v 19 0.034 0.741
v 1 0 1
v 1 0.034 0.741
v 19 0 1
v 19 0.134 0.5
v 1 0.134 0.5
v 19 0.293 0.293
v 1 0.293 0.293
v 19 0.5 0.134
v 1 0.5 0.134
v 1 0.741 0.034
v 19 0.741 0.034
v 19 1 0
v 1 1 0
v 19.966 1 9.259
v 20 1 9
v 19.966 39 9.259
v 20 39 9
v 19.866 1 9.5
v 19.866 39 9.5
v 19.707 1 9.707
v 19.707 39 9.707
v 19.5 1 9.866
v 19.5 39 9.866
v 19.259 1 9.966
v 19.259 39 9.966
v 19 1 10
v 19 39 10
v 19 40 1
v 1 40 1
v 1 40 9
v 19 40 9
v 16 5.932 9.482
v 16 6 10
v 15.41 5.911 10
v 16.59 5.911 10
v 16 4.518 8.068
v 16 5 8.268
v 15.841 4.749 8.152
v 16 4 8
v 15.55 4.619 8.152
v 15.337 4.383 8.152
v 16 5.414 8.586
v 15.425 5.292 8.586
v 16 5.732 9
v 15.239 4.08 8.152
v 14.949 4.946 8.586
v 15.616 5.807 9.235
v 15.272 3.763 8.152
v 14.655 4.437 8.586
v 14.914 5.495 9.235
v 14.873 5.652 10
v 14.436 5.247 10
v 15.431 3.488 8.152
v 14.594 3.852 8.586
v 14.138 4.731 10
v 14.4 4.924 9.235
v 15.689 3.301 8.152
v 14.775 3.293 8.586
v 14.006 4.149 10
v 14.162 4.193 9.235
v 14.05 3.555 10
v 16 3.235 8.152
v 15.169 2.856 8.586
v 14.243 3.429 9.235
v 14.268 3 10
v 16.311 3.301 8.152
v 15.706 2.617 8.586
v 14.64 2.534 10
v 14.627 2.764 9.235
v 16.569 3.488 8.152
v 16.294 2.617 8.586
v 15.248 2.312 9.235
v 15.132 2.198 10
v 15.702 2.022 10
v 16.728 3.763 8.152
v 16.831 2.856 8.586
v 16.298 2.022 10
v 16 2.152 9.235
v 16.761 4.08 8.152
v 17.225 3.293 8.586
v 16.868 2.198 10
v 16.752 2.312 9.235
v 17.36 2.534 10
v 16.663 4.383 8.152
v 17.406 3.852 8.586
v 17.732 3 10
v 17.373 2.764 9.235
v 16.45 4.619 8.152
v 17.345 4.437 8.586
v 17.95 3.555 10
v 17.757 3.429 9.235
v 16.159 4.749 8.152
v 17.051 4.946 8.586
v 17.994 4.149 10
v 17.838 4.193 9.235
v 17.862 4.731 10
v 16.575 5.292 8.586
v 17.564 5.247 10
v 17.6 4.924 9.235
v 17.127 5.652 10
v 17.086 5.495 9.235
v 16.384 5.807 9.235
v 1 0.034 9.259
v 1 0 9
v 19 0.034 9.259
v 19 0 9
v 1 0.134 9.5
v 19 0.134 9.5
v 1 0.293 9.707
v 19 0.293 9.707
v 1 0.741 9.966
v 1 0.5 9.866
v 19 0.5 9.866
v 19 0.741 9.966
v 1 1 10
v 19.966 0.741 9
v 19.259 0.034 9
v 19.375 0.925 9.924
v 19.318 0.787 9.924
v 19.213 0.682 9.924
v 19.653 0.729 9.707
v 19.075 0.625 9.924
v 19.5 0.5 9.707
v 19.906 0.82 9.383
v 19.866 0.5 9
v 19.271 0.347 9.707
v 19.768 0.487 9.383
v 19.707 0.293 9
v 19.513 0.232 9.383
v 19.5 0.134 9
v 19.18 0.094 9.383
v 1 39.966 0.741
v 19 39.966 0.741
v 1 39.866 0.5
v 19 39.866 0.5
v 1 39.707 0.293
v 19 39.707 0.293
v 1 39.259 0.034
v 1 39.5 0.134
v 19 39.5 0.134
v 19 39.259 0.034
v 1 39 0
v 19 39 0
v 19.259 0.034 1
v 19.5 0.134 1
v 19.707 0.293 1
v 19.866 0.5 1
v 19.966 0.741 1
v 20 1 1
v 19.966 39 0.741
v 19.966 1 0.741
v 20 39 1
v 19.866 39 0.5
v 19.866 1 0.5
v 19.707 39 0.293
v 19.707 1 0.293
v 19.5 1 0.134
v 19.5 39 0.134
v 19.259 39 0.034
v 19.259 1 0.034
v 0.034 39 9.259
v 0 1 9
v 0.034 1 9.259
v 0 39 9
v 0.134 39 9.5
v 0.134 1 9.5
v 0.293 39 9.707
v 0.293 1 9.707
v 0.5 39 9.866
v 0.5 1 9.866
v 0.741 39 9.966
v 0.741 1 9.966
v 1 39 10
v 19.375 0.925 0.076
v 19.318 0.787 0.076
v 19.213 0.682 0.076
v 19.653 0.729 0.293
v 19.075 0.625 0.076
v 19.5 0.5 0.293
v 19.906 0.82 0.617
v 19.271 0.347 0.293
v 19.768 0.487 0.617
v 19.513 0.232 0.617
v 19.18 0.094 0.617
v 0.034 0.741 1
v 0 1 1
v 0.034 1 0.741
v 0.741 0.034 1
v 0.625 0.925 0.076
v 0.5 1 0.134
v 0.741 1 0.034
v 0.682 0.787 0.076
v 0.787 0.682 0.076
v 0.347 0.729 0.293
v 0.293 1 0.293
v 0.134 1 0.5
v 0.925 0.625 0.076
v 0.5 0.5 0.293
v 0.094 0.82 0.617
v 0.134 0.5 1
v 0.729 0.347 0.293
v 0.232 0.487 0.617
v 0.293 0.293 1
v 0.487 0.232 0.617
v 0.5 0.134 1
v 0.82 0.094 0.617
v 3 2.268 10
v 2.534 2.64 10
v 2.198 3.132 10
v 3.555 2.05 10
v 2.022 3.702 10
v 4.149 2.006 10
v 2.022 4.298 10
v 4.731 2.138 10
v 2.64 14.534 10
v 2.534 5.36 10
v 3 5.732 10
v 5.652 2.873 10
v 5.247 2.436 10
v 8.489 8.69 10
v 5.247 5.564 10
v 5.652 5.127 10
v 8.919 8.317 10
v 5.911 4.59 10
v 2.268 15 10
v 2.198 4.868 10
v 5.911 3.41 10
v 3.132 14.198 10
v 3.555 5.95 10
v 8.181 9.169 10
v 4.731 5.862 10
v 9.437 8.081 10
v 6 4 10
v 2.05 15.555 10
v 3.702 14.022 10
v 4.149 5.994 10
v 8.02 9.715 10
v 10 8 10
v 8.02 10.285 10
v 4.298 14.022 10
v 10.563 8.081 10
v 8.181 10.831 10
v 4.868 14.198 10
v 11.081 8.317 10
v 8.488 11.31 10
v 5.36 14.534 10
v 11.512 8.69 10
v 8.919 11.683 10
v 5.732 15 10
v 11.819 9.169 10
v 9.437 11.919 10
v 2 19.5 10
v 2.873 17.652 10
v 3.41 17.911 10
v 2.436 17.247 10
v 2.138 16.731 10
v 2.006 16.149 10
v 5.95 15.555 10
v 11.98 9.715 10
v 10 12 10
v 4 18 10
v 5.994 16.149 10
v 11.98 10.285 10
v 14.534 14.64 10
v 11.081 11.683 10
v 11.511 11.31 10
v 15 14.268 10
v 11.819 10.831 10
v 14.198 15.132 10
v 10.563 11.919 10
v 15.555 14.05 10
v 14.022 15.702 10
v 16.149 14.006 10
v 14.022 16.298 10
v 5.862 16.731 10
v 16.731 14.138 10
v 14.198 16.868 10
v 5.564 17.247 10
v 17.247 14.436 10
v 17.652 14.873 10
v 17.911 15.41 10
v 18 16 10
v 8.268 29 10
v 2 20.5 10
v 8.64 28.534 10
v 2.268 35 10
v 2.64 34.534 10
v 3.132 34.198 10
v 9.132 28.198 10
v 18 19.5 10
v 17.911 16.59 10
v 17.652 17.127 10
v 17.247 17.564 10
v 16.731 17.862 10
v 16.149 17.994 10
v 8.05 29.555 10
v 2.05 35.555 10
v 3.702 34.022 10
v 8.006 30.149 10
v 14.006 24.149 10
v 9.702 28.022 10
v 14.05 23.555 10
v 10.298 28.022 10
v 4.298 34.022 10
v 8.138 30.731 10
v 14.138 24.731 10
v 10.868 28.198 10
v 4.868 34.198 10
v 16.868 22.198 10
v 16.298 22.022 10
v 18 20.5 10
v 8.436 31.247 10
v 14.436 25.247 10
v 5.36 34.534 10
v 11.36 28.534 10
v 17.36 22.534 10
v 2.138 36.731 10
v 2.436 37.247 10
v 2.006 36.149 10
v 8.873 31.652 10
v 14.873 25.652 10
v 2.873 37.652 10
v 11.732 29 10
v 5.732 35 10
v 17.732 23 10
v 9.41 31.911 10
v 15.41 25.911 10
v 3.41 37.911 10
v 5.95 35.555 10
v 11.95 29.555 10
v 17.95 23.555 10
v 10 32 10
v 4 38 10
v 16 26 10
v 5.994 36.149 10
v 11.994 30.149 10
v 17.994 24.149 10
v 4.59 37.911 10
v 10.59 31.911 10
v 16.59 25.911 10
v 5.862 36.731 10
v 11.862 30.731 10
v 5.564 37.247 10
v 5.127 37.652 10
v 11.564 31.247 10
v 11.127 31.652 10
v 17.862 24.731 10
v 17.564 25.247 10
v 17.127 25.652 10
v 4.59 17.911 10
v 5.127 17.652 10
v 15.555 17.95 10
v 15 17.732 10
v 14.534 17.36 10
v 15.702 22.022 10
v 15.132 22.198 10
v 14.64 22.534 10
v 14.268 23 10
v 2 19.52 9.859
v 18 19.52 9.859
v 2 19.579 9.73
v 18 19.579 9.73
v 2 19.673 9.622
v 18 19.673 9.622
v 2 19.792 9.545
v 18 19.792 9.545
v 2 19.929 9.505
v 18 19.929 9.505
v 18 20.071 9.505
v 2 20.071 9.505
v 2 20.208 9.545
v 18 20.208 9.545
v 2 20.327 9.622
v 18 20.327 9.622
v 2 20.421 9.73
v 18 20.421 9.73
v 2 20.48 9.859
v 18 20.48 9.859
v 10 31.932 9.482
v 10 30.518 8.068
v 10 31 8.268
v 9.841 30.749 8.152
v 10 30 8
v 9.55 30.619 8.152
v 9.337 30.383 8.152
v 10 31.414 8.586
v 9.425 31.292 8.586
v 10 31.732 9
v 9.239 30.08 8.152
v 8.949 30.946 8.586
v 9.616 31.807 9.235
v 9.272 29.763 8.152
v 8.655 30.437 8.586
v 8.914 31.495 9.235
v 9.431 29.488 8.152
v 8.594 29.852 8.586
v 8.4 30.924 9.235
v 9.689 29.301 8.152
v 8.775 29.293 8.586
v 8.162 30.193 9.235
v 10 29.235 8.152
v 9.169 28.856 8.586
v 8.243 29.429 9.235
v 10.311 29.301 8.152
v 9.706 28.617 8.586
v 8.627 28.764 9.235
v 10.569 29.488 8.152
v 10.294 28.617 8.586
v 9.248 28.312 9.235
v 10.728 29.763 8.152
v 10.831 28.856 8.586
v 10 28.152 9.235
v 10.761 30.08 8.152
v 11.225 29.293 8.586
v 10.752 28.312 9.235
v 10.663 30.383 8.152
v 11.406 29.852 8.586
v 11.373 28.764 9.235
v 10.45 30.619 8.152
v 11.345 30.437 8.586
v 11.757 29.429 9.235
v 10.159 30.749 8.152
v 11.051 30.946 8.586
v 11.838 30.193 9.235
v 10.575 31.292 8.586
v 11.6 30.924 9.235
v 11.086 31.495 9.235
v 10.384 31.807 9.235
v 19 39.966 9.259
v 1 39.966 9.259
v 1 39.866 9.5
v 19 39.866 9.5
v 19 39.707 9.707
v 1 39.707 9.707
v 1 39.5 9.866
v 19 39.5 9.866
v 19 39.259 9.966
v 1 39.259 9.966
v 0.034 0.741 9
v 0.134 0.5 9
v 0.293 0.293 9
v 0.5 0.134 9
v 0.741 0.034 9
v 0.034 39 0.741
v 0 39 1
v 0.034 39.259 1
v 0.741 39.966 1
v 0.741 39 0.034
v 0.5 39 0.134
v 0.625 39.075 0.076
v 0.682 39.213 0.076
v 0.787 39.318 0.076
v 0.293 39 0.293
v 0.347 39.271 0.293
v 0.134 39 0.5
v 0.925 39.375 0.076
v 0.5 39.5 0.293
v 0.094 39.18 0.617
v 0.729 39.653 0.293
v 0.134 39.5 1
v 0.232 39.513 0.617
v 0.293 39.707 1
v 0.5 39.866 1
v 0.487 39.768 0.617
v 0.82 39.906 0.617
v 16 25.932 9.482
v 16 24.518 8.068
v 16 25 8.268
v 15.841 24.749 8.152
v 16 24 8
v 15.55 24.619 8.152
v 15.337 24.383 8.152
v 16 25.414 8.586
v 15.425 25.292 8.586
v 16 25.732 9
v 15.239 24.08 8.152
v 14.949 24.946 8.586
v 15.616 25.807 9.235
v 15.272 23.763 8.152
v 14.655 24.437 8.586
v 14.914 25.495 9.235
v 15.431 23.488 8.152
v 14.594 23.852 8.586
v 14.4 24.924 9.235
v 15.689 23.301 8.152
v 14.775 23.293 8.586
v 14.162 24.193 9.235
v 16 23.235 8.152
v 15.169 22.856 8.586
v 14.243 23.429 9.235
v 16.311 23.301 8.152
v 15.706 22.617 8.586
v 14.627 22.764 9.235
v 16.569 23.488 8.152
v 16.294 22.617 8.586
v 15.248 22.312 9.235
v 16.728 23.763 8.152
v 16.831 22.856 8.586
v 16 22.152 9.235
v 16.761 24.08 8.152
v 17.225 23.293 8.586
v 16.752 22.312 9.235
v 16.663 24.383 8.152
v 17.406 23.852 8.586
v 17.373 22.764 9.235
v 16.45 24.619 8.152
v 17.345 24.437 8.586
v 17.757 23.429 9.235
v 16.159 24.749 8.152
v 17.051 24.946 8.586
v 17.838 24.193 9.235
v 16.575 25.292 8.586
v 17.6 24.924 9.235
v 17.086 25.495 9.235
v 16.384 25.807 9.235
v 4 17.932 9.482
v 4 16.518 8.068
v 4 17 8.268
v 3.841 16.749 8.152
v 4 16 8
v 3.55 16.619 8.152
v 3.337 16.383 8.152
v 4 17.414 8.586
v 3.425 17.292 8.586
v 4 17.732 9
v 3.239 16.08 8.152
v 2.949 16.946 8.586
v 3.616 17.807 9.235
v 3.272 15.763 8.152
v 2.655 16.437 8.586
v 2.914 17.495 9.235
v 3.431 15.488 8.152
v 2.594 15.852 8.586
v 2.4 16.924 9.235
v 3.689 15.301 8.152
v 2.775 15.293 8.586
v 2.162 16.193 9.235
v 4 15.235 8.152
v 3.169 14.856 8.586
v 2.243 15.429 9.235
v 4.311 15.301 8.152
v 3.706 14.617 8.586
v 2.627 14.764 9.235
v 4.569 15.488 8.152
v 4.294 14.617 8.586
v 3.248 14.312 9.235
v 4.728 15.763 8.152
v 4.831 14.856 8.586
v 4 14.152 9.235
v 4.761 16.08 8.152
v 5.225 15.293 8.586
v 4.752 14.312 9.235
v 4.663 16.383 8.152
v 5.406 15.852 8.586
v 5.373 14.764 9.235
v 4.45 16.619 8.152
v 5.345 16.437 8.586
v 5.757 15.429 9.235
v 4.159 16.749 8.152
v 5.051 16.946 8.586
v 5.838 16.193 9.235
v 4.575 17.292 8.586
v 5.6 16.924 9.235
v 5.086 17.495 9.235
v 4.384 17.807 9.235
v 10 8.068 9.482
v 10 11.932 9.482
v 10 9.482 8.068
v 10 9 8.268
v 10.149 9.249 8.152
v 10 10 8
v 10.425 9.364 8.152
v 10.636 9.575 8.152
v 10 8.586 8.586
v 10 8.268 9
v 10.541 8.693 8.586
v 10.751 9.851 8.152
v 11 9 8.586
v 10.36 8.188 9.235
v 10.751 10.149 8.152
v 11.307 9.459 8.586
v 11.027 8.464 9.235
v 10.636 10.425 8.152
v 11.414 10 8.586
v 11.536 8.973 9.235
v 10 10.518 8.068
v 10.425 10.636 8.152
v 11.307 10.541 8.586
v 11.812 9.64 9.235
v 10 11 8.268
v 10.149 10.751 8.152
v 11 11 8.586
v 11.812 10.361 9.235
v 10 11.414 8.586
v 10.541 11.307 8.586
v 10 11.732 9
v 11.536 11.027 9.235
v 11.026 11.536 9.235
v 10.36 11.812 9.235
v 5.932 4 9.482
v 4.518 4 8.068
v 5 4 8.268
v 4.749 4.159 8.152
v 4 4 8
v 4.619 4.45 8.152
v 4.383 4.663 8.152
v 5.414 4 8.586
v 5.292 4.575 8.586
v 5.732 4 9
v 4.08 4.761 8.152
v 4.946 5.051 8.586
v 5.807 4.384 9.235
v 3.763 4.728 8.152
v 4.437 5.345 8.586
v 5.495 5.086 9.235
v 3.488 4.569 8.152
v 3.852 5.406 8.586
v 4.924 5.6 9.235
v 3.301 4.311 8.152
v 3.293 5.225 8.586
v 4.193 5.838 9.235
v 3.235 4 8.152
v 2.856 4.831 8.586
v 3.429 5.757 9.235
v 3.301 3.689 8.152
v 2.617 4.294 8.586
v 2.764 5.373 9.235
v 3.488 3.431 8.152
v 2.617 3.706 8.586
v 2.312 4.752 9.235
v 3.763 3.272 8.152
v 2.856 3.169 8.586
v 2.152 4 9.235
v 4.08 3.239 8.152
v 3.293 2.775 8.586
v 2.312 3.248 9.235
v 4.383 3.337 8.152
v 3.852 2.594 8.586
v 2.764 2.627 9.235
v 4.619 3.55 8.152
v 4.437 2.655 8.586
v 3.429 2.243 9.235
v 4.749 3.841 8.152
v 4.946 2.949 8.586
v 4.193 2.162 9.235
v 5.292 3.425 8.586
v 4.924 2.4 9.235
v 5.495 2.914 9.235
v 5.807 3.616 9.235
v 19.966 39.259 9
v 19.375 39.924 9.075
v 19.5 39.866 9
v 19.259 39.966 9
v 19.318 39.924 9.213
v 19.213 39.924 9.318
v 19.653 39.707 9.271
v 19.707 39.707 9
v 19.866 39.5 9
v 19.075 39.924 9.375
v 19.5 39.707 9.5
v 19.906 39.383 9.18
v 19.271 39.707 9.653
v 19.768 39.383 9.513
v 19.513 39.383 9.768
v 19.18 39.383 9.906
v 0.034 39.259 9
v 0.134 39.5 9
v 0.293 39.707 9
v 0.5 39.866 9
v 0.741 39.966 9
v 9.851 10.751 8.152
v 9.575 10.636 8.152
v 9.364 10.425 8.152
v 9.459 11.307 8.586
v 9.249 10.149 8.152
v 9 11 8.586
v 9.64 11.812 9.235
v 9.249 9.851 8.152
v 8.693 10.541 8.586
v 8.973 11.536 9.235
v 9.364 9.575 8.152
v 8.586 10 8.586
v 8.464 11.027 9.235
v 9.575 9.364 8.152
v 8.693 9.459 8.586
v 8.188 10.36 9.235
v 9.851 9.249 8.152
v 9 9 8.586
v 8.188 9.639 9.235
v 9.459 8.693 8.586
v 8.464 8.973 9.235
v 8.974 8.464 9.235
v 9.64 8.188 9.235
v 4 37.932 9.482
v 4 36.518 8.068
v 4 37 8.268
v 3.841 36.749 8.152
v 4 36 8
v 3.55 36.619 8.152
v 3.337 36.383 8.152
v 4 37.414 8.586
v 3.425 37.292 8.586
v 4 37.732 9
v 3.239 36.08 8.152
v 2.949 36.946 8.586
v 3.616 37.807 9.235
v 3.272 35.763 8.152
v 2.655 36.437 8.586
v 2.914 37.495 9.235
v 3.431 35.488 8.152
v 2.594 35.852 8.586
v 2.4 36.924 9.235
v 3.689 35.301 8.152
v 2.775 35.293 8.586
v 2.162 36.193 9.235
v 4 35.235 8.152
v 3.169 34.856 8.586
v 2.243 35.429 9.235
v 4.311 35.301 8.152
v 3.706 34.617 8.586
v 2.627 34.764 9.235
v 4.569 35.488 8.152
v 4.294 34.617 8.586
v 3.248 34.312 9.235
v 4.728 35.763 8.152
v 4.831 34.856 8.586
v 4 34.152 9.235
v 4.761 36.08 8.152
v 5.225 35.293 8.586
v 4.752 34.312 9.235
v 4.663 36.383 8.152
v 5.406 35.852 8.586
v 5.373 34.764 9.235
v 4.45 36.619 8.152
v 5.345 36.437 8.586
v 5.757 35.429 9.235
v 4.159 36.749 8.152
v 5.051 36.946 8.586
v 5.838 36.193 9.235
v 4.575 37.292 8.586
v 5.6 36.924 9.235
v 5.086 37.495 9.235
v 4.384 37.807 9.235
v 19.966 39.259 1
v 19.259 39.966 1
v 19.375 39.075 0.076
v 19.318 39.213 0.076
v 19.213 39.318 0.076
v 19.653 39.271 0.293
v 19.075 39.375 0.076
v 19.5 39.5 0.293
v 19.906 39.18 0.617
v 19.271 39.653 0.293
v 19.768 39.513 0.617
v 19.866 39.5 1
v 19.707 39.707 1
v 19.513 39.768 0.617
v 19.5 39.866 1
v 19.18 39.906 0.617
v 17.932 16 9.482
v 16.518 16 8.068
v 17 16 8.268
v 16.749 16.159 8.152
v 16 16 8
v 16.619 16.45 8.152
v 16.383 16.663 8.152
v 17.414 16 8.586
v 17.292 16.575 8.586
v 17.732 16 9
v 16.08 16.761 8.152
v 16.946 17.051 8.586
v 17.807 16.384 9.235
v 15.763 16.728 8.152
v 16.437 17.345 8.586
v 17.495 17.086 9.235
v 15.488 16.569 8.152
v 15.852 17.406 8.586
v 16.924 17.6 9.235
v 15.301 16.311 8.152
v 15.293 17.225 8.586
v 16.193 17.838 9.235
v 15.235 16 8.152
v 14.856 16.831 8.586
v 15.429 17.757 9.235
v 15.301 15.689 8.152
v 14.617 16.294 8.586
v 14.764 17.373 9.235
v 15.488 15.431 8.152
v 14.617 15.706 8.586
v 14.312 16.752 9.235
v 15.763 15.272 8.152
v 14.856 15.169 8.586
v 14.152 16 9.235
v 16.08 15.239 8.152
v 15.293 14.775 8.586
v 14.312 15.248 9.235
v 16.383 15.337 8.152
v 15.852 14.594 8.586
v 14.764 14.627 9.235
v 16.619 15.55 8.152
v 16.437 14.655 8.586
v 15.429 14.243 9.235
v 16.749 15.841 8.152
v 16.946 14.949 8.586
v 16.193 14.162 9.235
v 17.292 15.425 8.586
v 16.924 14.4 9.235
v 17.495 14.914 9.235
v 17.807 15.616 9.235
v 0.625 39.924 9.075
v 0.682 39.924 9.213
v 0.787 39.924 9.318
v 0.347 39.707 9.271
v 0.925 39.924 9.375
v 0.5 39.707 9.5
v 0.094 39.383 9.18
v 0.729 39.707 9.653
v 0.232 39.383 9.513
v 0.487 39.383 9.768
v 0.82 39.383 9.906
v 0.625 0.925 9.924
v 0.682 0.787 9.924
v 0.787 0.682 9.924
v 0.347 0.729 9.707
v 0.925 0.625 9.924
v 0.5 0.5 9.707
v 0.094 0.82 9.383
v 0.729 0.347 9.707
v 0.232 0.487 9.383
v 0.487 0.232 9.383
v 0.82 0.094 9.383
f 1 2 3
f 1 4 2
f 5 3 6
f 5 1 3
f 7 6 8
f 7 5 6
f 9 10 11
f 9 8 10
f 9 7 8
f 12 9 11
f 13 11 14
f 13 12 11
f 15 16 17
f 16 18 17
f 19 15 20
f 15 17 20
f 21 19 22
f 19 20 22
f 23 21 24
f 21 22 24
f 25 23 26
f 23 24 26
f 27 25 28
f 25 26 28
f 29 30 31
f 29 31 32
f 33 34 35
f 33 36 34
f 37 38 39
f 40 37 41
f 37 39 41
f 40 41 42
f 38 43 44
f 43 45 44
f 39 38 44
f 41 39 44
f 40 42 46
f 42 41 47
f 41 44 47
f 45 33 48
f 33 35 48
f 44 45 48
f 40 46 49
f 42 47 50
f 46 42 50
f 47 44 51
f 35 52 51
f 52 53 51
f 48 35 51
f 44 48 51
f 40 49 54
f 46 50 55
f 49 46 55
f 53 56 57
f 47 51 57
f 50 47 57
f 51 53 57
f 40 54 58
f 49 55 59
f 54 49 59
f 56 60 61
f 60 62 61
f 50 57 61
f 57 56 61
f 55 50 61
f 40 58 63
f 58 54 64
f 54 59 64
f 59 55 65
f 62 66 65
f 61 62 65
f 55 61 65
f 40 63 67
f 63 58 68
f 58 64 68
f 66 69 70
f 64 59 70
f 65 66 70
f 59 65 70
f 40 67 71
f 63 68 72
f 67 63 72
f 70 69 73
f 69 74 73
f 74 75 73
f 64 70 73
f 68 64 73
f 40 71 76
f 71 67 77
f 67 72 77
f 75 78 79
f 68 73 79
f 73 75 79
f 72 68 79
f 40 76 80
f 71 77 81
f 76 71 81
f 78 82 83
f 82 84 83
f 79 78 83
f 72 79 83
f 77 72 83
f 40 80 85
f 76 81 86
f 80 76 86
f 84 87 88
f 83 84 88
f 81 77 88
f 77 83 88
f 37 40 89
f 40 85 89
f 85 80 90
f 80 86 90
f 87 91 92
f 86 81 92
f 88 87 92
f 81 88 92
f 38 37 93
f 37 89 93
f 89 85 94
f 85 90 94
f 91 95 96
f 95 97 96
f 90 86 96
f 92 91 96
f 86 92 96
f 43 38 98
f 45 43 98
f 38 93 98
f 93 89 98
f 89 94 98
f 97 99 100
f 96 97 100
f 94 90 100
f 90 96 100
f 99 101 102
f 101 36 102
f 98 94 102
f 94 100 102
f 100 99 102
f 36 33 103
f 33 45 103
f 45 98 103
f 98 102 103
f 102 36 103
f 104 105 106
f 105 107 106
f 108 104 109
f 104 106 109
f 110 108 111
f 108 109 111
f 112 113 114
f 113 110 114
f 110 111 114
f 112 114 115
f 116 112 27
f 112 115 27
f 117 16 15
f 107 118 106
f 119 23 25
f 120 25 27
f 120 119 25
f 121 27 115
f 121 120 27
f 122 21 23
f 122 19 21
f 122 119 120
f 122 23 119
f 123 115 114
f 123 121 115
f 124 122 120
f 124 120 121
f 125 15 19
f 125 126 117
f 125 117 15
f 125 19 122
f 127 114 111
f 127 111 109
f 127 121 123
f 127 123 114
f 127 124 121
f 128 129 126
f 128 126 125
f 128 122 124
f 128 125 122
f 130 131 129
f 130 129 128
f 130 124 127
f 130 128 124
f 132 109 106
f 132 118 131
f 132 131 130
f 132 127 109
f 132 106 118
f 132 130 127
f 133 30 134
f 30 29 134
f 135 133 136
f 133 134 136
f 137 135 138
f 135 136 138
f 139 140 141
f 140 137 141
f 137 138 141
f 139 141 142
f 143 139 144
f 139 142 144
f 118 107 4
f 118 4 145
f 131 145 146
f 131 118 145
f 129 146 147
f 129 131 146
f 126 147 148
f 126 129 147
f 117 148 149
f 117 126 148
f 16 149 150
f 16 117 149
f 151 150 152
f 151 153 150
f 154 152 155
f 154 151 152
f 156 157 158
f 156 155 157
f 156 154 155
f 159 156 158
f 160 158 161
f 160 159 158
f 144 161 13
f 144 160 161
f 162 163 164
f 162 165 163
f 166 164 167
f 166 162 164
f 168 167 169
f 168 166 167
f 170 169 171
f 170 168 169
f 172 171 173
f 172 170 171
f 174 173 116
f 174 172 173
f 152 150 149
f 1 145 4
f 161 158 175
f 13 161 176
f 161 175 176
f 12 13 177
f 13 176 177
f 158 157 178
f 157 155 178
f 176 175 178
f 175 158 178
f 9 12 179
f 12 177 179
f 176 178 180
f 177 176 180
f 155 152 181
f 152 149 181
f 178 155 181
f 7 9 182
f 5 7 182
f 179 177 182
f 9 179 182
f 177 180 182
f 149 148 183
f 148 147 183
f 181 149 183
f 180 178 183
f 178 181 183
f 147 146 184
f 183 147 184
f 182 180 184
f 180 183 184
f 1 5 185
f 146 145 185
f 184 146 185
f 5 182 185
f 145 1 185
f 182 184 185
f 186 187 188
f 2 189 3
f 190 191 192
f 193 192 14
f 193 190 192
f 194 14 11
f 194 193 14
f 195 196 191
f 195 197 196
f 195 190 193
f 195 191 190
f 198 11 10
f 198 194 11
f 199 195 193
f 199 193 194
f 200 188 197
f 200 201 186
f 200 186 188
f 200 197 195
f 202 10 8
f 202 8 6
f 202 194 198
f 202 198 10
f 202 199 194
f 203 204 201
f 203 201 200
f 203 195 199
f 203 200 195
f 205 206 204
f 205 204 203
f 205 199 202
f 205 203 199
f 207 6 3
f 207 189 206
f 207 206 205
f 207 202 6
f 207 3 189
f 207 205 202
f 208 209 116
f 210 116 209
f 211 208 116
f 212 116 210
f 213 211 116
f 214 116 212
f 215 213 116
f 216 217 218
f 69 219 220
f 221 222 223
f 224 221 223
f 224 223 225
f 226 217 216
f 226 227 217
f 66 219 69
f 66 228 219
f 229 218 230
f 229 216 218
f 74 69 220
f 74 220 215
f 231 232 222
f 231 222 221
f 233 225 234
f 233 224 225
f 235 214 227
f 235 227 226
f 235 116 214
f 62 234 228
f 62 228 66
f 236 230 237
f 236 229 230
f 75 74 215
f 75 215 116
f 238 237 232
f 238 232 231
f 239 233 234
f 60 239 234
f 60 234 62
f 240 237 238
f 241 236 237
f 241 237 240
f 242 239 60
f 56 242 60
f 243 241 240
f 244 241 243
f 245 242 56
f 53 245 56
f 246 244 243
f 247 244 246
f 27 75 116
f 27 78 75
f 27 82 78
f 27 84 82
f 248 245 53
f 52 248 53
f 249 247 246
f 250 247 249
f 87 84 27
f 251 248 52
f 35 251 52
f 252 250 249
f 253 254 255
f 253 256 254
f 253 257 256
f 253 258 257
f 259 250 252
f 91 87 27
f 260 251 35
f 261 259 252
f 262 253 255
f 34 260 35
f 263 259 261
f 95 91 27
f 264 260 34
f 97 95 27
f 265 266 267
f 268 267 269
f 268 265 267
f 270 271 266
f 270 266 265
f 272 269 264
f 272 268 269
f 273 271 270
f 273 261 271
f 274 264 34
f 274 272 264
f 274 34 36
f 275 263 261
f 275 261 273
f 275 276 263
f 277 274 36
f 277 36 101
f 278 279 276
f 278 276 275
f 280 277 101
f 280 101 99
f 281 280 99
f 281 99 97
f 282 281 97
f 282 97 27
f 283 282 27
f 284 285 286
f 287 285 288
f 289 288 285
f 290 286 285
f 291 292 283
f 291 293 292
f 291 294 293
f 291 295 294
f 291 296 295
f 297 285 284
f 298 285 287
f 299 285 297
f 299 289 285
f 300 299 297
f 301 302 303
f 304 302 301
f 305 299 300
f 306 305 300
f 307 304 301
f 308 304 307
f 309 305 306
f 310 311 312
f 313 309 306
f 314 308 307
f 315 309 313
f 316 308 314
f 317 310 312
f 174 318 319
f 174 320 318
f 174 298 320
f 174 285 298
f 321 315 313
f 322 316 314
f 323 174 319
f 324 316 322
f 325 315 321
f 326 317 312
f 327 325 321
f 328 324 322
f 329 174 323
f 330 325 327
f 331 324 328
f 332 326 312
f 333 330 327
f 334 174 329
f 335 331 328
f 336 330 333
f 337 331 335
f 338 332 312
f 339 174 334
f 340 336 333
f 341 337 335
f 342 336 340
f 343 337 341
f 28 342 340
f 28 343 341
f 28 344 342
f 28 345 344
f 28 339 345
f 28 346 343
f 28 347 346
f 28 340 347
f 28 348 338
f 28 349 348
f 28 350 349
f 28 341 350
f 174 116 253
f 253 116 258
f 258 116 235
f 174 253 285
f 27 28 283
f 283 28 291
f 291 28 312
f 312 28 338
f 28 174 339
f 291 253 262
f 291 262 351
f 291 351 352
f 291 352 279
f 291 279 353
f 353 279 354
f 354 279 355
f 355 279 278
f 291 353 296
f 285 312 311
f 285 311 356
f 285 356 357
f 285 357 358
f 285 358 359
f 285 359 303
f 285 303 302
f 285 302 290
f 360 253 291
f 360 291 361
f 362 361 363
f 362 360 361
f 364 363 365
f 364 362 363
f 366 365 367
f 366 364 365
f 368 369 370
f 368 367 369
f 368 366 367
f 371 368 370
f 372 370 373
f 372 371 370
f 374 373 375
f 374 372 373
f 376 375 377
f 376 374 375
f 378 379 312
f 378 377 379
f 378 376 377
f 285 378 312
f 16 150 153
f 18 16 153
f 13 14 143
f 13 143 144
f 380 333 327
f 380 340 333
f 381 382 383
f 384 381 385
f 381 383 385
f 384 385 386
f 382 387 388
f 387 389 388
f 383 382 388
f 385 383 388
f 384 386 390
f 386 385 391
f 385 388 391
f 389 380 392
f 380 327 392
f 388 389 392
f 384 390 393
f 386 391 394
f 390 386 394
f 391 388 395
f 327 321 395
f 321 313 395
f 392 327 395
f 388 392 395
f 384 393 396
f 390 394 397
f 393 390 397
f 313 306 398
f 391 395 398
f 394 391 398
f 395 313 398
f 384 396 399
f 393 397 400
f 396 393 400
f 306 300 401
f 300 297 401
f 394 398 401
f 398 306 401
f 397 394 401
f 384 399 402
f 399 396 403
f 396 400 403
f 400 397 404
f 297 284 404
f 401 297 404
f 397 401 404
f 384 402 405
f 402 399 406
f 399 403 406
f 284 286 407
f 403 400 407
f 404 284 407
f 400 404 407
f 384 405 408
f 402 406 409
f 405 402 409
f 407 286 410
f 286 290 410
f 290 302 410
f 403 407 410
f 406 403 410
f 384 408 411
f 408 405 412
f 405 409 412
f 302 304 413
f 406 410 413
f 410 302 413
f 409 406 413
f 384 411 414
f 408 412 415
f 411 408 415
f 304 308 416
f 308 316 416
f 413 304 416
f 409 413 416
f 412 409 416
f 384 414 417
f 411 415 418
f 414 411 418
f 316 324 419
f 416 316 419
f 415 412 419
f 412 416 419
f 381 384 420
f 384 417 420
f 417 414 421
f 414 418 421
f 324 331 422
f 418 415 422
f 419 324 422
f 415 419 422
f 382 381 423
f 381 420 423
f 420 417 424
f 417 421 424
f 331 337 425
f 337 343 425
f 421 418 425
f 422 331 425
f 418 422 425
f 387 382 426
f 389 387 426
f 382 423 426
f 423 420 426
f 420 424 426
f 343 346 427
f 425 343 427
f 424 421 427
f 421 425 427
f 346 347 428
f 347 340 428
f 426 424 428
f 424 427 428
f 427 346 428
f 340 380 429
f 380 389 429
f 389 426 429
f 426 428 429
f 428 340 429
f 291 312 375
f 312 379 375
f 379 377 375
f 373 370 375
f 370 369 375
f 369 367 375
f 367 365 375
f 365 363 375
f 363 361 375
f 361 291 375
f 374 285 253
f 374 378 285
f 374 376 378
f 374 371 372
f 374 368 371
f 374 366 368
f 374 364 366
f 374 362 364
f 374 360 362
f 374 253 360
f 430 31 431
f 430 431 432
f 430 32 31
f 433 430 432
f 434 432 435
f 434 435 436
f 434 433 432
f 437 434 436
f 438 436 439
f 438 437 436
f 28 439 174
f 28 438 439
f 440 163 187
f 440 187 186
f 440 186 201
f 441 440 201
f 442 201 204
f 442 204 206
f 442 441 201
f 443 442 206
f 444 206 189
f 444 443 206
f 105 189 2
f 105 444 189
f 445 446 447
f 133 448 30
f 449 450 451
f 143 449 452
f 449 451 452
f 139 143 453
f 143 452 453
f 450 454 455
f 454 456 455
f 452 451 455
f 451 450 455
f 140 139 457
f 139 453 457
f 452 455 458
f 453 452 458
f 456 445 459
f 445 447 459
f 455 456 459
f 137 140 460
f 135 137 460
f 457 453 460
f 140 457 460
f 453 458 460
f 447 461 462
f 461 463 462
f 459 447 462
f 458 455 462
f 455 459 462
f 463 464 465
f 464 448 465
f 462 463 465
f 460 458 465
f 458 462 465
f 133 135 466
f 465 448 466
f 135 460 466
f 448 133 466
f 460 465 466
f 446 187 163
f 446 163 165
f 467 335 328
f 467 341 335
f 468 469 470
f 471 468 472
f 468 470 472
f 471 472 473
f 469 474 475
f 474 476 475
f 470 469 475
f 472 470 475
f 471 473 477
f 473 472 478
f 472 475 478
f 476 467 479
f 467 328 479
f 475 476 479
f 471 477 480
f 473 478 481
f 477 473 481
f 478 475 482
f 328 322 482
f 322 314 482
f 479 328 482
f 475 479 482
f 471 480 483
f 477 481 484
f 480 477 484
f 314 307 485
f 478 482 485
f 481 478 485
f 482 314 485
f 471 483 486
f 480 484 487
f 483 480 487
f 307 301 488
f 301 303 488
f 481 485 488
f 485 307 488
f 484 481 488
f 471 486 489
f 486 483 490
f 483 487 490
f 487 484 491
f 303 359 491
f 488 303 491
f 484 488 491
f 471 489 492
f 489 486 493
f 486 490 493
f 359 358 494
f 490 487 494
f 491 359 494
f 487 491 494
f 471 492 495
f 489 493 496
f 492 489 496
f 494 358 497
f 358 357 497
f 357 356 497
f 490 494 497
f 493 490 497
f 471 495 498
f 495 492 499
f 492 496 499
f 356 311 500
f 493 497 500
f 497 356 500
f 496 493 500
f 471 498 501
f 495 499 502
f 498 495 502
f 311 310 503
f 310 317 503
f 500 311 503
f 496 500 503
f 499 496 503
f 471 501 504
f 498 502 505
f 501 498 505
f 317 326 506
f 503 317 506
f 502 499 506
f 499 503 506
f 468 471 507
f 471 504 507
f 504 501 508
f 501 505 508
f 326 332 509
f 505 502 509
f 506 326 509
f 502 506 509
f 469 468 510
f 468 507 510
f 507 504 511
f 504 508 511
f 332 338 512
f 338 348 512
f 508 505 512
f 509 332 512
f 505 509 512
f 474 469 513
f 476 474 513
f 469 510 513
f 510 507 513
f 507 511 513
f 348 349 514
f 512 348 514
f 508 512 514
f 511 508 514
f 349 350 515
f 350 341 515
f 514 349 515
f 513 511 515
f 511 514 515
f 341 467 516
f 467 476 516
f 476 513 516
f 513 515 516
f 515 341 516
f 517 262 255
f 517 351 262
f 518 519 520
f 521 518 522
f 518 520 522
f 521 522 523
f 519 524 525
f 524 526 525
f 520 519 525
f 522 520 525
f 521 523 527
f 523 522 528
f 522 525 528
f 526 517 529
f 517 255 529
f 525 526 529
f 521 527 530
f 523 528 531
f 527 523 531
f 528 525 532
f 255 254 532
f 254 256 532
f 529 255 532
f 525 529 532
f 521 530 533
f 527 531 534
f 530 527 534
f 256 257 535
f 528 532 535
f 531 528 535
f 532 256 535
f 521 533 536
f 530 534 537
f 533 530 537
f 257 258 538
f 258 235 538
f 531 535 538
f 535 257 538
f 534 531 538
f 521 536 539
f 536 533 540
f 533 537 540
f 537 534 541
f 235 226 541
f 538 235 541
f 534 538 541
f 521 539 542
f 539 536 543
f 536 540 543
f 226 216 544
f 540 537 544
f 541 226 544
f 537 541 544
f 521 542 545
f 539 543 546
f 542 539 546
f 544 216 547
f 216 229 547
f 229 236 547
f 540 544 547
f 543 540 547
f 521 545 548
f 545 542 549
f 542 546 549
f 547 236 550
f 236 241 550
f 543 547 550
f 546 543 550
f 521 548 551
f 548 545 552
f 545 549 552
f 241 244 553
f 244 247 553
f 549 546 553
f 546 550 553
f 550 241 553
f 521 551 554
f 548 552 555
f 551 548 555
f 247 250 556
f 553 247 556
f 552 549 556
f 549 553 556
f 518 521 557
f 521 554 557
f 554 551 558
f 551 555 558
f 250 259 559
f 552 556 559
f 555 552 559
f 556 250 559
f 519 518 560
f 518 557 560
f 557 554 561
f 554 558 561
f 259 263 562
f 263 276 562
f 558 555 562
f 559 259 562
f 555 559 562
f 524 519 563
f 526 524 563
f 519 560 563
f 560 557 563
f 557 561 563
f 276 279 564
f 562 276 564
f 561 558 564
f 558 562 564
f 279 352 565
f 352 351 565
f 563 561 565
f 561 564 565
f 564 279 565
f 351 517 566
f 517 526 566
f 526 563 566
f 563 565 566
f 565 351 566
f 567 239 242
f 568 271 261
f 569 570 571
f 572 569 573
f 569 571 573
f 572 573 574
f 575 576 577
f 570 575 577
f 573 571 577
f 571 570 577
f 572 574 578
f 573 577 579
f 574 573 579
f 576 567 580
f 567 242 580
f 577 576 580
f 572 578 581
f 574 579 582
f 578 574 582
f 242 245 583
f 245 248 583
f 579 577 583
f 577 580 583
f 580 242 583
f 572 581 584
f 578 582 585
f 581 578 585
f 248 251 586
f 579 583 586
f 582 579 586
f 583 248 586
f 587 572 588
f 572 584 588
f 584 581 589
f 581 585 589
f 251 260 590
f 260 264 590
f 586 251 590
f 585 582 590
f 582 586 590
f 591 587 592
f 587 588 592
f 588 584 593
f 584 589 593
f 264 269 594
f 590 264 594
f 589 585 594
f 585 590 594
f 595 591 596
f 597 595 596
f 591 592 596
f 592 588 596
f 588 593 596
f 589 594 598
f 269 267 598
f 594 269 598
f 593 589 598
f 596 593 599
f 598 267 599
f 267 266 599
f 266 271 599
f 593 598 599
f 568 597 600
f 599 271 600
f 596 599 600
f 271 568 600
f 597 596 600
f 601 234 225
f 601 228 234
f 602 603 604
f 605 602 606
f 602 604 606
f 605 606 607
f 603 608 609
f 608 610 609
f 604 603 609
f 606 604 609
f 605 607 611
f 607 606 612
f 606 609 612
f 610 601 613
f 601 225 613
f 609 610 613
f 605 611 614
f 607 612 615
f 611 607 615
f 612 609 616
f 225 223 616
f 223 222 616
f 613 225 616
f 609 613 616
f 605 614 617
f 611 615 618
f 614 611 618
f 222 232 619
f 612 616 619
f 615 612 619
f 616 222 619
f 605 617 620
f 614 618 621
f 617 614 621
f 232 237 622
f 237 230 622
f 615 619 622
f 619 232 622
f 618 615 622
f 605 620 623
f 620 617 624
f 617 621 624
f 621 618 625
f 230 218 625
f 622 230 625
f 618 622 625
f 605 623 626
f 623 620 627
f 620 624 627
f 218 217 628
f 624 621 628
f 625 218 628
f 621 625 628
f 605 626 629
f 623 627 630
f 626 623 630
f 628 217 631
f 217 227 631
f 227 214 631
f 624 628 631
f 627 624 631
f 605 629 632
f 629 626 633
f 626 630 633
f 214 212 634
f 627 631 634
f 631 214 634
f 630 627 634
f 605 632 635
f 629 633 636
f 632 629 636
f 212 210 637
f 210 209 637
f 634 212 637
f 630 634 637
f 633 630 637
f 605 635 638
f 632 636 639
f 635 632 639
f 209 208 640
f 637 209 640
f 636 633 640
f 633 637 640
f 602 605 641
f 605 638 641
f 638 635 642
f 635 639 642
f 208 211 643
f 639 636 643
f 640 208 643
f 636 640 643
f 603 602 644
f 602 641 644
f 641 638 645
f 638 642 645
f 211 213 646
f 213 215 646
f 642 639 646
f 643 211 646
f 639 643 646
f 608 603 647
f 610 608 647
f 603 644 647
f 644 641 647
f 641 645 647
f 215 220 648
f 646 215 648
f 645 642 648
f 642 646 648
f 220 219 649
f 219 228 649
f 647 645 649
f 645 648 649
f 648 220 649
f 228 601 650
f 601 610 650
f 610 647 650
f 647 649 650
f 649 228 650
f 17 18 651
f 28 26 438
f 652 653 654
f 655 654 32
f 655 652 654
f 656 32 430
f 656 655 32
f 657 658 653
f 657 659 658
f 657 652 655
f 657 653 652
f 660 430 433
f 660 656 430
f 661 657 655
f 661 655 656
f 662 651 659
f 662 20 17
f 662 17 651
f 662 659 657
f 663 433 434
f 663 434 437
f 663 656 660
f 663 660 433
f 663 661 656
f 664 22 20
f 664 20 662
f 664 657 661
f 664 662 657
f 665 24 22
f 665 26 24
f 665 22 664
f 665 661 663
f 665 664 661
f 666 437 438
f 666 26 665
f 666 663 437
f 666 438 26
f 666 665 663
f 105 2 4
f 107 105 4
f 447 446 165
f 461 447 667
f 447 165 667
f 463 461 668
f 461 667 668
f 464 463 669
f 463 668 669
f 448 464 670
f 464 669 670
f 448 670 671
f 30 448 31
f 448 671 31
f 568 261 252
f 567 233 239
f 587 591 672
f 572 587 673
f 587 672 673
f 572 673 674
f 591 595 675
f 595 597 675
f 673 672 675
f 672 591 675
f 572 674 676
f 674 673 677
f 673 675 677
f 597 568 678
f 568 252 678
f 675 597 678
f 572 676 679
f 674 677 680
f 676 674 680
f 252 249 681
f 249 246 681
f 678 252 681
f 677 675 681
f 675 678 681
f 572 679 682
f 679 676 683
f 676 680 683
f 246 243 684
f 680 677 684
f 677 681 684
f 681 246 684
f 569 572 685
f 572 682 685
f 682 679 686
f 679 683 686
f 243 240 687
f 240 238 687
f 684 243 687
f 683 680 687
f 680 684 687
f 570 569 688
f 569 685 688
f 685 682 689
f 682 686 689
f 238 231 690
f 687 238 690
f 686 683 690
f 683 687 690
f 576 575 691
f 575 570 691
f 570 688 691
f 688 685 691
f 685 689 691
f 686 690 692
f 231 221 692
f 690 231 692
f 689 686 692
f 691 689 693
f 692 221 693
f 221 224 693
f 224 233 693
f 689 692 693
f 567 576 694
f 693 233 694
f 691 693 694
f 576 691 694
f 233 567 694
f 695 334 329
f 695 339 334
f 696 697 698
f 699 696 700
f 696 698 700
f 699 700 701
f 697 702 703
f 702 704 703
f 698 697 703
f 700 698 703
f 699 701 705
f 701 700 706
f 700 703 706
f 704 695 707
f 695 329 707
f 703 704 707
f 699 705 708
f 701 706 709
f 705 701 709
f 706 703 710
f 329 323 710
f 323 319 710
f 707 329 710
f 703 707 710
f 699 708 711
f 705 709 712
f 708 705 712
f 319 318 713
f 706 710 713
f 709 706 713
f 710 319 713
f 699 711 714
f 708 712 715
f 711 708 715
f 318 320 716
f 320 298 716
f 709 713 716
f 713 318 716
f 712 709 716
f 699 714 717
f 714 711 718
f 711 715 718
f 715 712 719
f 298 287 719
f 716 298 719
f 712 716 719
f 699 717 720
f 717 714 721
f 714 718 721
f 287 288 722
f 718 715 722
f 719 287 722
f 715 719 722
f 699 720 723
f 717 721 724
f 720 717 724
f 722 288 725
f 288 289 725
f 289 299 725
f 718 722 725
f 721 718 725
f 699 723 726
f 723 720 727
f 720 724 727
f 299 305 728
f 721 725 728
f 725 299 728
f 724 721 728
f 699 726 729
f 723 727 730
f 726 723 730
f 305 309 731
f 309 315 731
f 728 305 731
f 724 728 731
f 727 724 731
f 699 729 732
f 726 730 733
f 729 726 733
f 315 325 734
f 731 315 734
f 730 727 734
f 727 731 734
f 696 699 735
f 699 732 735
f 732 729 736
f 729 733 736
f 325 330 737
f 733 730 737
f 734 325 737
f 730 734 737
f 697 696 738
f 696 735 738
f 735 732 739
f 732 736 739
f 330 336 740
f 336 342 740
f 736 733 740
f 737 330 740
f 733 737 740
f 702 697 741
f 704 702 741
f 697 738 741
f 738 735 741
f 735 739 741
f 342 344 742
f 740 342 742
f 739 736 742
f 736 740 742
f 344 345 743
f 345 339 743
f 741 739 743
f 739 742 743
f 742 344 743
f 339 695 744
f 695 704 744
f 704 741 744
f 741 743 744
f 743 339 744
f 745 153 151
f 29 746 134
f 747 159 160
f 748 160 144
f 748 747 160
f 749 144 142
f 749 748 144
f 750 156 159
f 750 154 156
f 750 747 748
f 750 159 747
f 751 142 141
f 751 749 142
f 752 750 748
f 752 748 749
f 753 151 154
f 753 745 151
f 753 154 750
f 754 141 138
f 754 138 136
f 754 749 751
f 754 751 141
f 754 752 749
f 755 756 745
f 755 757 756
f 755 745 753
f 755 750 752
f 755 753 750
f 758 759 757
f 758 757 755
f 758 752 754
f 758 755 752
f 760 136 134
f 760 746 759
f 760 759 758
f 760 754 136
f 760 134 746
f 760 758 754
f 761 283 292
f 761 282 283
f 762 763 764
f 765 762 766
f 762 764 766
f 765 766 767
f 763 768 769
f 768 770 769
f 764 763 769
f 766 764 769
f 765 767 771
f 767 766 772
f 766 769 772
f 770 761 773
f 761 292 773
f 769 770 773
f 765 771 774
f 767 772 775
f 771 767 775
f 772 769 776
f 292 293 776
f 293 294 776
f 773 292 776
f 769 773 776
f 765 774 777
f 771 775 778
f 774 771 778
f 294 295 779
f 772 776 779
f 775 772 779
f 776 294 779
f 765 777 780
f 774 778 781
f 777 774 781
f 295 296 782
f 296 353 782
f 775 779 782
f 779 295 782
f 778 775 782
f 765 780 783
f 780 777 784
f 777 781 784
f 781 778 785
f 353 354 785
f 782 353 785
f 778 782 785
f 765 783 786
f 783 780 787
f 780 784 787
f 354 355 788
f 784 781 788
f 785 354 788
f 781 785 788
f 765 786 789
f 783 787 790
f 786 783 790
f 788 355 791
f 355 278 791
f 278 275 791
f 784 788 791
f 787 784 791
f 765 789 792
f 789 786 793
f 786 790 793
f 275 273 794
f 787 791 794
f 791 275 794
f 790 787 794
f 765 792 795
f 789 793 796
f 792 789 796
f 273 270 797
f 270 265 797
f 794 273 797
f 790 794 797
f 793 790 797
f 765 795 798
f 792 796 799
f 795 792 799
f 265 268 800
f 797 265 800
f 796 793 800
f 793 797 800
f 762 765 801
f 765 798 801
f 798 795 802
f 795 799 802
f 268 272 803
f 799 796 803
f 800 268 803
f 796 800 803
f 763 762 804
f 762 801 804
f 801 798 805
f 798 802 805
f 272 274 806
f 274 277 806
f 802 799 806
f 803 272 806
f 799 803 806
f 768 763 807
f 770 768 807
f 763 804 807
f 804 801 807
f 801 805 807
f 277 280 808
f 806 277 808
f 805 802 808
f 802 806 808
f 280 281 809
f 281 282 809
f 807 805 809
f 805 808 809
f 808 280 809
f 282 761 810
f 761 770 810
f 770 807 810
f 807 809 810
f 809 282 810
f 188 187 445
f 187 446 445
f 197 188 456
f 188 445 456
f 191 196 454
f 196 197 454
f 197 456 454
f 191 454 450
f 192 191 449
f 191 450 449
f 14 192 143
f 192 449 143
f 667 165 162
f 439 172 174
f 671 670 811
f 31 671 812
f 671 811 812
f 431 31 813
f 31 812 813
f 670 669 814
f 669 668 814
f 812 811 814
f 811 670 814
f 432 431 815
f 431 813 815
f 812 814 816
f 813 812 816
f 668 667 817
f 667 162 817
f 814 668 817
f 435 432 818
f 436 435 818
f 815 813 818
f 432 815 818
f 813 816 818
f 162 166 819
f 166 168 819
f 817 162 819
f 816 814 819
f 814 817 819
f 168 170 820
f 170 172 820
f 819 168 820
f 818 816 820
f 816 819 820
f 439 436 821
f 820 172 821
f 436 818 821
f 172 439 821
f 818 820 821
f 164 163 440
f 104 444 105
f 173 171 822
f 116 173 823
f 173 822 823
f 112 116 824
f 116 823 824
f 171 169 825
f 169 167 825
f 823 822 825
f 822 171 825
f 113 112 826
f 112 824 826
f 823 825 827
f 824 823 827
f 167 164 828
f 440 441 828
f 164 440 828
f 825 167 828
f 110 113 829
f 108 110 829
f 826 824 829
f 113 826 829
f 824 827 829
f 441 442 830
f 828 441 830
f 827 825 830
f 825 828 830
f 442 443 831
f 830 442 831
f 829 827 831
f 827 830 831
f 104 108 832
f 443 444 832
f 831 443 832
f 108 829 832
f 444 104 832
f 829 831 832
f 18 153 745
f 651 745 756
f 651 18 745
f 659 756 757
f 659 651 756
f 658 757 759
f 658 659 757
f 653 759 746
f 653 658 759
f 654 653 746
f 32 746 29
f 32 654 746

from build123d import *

# Parameters (mm, degrees)
CYLINDER_R               = 0.5
CYLINDER_DEPTH           = 16
ARRAY002_X_COUNT         = 3
ARRAY002_X_PITCH         = 8.485281
ARRAY001_X_COUNT         = 3
ARRAY001_X_PITCH         = 8.485281
ARRAY001_PLACEMENT_ANGLE = 90
ARRAY_X_COUNT            = 3
ARRAY_X_PITCH            = 8.485281
ARRAY_PLACEMENT_ANGLE    = 90
BOX_W                    = 20
BOX_H                    = 40
BOX_DEPTH                = 10
FILLET_R                 = 1


with BuildPart() as division:
    # Cylinder → Cylinder (new body)
    with BuildSketch(Plane(origin=(2, 20, 10), x_dir=(0, 0, -1), z_dir=(1, 0, 0))):
        Circle(CYLINDER_R)
    extrude(amount=CYLINDER_DEPTH)


with BuildPart() as array002:
    # Sphere002 → Sphere002 (revolve)
    with BuildSketch(Plane.XZ):
        with BuildLine():
            ThreePointArc((0, -2), (2, 0), (0, 2))
            Line((0, 2), (0, -2))
        make_face()
    revolve(axis=Axis((0, 0, 0), (0, 0, 1)))

    # Array002 X: Array002 ×3


with BuildPart() as array002_1:
    add(array002.part)
    with Locations(*[Vector(0.707107, 0.707107, 0) * (i * ARRAY002_X_PITCH) for i in range(1, ARRAY002_X_COUNT)]):
        add(array002.part)


with BuildPart() as cinco:
    # Sphere001 → Sphere001 (revolve)
    with BuildSketch(Plane.XZ):
        with BuildLine():
            ThreePointArc((0, -2), (2, 0), (0, 2))
            Line((0, 2), (0, -2))
        make_face()
    revolve(axis=Axis((0, 0, 0), (0, 0, 1)))

    # Array001 X: cinco ×3


with BuildPart() as cinco_1:
    add(cinco.part)
    with Locations(*[Vector(0.707107, 0.707107, 0) * (i * ARRAY001_X_PITCH) for i in range(1, ARRAY001_X_COUNT)]):
        add(cinco.part)


with BuildPart() as cinco_2:
    # Array001 placement: moved
    add(cinco_1.part.moved(Location((12, 0, 0))).rotate(Axis((12, 0, 0), (0, 0, 1)), ARRAY001_PLACEMENT_ANGLE))

    # Fusion: union Array002
    add(array002_1.part)


with BuildPart() as cinco_3:
    # Fusion placement: moved
    add(cinco_2.part.moved(Location((4, 4, 10))))


with BuildPart() as grabado_tres_cinco:
    # Sphere → Sphere (revolve)
    with BuildSketch(Plane.XZ):
        with BuildLine():
            ThreePointArc((0, -2), (2, 0), (0, 2))
            Line((0, 2), (0, -2))
        make_face()
    revolve(axis=Axis((0, 0, 0), (0, 0, 1)))

    # Array X: grabado_tres_cinco ×3


with BuildPart() as grabado_tres_cinco_1:
    add(grabado_tres_cinco.part)
    with Locations(*[Vector(0.707107, 0.707107, 0) * (i * ARRAY_X_PITCH) for i in range(1, ARRAY_X_COUNT)]):
        add(grabado_tres_cinco.part)


with BuildPart() as grabado_tres_cinco_2:
    # Array placement: moved
    add(grabado_tres_cinco_1.part.moved(Location((16, 24, 10))).rotate(Axis((16, 24, 10), (0, 0, 1)), ARRAY_PLACEMENT_ANGLE))

    # Fusion001: union cinco
    add(cinco_3.part)

    # Fusion002: union division
    add(division.part)


with BuildPart() as pieza_tres_cicno:
    # Box → Box (new body)
    with BuildSketch(Plane.XY):
        with Locations((10, 20)):
            Rectangle(BOX_W, BOX_H)
    extrude(amount=BOX_DEPTH)

    # Fillet
    fillet_edges = [pieza_tres_cicno.edges().sort_by_distance(p)[0] for p in [
        (0, 0, 5),
        (0, 20, 10),
        (0, 40, 5),
        (0, 20, 0),
        (20, 0, 5),
        (20, 20, 10),
        (20, 40, 5),
        (20, 20, 0),
        (10, 0, 0),
        (10, 0, 10),
        (10, 40, 0),
        (10, 40, 10),
    ]]
    fillet(fillet_edges, radius=FILLET_R)

    # Cut: cut grabado_tres_cinco
    add(grabado_tres_cinco_2.part, mode=Mode.SUBTRACT)


solid = pieza_tres_cicno.part
